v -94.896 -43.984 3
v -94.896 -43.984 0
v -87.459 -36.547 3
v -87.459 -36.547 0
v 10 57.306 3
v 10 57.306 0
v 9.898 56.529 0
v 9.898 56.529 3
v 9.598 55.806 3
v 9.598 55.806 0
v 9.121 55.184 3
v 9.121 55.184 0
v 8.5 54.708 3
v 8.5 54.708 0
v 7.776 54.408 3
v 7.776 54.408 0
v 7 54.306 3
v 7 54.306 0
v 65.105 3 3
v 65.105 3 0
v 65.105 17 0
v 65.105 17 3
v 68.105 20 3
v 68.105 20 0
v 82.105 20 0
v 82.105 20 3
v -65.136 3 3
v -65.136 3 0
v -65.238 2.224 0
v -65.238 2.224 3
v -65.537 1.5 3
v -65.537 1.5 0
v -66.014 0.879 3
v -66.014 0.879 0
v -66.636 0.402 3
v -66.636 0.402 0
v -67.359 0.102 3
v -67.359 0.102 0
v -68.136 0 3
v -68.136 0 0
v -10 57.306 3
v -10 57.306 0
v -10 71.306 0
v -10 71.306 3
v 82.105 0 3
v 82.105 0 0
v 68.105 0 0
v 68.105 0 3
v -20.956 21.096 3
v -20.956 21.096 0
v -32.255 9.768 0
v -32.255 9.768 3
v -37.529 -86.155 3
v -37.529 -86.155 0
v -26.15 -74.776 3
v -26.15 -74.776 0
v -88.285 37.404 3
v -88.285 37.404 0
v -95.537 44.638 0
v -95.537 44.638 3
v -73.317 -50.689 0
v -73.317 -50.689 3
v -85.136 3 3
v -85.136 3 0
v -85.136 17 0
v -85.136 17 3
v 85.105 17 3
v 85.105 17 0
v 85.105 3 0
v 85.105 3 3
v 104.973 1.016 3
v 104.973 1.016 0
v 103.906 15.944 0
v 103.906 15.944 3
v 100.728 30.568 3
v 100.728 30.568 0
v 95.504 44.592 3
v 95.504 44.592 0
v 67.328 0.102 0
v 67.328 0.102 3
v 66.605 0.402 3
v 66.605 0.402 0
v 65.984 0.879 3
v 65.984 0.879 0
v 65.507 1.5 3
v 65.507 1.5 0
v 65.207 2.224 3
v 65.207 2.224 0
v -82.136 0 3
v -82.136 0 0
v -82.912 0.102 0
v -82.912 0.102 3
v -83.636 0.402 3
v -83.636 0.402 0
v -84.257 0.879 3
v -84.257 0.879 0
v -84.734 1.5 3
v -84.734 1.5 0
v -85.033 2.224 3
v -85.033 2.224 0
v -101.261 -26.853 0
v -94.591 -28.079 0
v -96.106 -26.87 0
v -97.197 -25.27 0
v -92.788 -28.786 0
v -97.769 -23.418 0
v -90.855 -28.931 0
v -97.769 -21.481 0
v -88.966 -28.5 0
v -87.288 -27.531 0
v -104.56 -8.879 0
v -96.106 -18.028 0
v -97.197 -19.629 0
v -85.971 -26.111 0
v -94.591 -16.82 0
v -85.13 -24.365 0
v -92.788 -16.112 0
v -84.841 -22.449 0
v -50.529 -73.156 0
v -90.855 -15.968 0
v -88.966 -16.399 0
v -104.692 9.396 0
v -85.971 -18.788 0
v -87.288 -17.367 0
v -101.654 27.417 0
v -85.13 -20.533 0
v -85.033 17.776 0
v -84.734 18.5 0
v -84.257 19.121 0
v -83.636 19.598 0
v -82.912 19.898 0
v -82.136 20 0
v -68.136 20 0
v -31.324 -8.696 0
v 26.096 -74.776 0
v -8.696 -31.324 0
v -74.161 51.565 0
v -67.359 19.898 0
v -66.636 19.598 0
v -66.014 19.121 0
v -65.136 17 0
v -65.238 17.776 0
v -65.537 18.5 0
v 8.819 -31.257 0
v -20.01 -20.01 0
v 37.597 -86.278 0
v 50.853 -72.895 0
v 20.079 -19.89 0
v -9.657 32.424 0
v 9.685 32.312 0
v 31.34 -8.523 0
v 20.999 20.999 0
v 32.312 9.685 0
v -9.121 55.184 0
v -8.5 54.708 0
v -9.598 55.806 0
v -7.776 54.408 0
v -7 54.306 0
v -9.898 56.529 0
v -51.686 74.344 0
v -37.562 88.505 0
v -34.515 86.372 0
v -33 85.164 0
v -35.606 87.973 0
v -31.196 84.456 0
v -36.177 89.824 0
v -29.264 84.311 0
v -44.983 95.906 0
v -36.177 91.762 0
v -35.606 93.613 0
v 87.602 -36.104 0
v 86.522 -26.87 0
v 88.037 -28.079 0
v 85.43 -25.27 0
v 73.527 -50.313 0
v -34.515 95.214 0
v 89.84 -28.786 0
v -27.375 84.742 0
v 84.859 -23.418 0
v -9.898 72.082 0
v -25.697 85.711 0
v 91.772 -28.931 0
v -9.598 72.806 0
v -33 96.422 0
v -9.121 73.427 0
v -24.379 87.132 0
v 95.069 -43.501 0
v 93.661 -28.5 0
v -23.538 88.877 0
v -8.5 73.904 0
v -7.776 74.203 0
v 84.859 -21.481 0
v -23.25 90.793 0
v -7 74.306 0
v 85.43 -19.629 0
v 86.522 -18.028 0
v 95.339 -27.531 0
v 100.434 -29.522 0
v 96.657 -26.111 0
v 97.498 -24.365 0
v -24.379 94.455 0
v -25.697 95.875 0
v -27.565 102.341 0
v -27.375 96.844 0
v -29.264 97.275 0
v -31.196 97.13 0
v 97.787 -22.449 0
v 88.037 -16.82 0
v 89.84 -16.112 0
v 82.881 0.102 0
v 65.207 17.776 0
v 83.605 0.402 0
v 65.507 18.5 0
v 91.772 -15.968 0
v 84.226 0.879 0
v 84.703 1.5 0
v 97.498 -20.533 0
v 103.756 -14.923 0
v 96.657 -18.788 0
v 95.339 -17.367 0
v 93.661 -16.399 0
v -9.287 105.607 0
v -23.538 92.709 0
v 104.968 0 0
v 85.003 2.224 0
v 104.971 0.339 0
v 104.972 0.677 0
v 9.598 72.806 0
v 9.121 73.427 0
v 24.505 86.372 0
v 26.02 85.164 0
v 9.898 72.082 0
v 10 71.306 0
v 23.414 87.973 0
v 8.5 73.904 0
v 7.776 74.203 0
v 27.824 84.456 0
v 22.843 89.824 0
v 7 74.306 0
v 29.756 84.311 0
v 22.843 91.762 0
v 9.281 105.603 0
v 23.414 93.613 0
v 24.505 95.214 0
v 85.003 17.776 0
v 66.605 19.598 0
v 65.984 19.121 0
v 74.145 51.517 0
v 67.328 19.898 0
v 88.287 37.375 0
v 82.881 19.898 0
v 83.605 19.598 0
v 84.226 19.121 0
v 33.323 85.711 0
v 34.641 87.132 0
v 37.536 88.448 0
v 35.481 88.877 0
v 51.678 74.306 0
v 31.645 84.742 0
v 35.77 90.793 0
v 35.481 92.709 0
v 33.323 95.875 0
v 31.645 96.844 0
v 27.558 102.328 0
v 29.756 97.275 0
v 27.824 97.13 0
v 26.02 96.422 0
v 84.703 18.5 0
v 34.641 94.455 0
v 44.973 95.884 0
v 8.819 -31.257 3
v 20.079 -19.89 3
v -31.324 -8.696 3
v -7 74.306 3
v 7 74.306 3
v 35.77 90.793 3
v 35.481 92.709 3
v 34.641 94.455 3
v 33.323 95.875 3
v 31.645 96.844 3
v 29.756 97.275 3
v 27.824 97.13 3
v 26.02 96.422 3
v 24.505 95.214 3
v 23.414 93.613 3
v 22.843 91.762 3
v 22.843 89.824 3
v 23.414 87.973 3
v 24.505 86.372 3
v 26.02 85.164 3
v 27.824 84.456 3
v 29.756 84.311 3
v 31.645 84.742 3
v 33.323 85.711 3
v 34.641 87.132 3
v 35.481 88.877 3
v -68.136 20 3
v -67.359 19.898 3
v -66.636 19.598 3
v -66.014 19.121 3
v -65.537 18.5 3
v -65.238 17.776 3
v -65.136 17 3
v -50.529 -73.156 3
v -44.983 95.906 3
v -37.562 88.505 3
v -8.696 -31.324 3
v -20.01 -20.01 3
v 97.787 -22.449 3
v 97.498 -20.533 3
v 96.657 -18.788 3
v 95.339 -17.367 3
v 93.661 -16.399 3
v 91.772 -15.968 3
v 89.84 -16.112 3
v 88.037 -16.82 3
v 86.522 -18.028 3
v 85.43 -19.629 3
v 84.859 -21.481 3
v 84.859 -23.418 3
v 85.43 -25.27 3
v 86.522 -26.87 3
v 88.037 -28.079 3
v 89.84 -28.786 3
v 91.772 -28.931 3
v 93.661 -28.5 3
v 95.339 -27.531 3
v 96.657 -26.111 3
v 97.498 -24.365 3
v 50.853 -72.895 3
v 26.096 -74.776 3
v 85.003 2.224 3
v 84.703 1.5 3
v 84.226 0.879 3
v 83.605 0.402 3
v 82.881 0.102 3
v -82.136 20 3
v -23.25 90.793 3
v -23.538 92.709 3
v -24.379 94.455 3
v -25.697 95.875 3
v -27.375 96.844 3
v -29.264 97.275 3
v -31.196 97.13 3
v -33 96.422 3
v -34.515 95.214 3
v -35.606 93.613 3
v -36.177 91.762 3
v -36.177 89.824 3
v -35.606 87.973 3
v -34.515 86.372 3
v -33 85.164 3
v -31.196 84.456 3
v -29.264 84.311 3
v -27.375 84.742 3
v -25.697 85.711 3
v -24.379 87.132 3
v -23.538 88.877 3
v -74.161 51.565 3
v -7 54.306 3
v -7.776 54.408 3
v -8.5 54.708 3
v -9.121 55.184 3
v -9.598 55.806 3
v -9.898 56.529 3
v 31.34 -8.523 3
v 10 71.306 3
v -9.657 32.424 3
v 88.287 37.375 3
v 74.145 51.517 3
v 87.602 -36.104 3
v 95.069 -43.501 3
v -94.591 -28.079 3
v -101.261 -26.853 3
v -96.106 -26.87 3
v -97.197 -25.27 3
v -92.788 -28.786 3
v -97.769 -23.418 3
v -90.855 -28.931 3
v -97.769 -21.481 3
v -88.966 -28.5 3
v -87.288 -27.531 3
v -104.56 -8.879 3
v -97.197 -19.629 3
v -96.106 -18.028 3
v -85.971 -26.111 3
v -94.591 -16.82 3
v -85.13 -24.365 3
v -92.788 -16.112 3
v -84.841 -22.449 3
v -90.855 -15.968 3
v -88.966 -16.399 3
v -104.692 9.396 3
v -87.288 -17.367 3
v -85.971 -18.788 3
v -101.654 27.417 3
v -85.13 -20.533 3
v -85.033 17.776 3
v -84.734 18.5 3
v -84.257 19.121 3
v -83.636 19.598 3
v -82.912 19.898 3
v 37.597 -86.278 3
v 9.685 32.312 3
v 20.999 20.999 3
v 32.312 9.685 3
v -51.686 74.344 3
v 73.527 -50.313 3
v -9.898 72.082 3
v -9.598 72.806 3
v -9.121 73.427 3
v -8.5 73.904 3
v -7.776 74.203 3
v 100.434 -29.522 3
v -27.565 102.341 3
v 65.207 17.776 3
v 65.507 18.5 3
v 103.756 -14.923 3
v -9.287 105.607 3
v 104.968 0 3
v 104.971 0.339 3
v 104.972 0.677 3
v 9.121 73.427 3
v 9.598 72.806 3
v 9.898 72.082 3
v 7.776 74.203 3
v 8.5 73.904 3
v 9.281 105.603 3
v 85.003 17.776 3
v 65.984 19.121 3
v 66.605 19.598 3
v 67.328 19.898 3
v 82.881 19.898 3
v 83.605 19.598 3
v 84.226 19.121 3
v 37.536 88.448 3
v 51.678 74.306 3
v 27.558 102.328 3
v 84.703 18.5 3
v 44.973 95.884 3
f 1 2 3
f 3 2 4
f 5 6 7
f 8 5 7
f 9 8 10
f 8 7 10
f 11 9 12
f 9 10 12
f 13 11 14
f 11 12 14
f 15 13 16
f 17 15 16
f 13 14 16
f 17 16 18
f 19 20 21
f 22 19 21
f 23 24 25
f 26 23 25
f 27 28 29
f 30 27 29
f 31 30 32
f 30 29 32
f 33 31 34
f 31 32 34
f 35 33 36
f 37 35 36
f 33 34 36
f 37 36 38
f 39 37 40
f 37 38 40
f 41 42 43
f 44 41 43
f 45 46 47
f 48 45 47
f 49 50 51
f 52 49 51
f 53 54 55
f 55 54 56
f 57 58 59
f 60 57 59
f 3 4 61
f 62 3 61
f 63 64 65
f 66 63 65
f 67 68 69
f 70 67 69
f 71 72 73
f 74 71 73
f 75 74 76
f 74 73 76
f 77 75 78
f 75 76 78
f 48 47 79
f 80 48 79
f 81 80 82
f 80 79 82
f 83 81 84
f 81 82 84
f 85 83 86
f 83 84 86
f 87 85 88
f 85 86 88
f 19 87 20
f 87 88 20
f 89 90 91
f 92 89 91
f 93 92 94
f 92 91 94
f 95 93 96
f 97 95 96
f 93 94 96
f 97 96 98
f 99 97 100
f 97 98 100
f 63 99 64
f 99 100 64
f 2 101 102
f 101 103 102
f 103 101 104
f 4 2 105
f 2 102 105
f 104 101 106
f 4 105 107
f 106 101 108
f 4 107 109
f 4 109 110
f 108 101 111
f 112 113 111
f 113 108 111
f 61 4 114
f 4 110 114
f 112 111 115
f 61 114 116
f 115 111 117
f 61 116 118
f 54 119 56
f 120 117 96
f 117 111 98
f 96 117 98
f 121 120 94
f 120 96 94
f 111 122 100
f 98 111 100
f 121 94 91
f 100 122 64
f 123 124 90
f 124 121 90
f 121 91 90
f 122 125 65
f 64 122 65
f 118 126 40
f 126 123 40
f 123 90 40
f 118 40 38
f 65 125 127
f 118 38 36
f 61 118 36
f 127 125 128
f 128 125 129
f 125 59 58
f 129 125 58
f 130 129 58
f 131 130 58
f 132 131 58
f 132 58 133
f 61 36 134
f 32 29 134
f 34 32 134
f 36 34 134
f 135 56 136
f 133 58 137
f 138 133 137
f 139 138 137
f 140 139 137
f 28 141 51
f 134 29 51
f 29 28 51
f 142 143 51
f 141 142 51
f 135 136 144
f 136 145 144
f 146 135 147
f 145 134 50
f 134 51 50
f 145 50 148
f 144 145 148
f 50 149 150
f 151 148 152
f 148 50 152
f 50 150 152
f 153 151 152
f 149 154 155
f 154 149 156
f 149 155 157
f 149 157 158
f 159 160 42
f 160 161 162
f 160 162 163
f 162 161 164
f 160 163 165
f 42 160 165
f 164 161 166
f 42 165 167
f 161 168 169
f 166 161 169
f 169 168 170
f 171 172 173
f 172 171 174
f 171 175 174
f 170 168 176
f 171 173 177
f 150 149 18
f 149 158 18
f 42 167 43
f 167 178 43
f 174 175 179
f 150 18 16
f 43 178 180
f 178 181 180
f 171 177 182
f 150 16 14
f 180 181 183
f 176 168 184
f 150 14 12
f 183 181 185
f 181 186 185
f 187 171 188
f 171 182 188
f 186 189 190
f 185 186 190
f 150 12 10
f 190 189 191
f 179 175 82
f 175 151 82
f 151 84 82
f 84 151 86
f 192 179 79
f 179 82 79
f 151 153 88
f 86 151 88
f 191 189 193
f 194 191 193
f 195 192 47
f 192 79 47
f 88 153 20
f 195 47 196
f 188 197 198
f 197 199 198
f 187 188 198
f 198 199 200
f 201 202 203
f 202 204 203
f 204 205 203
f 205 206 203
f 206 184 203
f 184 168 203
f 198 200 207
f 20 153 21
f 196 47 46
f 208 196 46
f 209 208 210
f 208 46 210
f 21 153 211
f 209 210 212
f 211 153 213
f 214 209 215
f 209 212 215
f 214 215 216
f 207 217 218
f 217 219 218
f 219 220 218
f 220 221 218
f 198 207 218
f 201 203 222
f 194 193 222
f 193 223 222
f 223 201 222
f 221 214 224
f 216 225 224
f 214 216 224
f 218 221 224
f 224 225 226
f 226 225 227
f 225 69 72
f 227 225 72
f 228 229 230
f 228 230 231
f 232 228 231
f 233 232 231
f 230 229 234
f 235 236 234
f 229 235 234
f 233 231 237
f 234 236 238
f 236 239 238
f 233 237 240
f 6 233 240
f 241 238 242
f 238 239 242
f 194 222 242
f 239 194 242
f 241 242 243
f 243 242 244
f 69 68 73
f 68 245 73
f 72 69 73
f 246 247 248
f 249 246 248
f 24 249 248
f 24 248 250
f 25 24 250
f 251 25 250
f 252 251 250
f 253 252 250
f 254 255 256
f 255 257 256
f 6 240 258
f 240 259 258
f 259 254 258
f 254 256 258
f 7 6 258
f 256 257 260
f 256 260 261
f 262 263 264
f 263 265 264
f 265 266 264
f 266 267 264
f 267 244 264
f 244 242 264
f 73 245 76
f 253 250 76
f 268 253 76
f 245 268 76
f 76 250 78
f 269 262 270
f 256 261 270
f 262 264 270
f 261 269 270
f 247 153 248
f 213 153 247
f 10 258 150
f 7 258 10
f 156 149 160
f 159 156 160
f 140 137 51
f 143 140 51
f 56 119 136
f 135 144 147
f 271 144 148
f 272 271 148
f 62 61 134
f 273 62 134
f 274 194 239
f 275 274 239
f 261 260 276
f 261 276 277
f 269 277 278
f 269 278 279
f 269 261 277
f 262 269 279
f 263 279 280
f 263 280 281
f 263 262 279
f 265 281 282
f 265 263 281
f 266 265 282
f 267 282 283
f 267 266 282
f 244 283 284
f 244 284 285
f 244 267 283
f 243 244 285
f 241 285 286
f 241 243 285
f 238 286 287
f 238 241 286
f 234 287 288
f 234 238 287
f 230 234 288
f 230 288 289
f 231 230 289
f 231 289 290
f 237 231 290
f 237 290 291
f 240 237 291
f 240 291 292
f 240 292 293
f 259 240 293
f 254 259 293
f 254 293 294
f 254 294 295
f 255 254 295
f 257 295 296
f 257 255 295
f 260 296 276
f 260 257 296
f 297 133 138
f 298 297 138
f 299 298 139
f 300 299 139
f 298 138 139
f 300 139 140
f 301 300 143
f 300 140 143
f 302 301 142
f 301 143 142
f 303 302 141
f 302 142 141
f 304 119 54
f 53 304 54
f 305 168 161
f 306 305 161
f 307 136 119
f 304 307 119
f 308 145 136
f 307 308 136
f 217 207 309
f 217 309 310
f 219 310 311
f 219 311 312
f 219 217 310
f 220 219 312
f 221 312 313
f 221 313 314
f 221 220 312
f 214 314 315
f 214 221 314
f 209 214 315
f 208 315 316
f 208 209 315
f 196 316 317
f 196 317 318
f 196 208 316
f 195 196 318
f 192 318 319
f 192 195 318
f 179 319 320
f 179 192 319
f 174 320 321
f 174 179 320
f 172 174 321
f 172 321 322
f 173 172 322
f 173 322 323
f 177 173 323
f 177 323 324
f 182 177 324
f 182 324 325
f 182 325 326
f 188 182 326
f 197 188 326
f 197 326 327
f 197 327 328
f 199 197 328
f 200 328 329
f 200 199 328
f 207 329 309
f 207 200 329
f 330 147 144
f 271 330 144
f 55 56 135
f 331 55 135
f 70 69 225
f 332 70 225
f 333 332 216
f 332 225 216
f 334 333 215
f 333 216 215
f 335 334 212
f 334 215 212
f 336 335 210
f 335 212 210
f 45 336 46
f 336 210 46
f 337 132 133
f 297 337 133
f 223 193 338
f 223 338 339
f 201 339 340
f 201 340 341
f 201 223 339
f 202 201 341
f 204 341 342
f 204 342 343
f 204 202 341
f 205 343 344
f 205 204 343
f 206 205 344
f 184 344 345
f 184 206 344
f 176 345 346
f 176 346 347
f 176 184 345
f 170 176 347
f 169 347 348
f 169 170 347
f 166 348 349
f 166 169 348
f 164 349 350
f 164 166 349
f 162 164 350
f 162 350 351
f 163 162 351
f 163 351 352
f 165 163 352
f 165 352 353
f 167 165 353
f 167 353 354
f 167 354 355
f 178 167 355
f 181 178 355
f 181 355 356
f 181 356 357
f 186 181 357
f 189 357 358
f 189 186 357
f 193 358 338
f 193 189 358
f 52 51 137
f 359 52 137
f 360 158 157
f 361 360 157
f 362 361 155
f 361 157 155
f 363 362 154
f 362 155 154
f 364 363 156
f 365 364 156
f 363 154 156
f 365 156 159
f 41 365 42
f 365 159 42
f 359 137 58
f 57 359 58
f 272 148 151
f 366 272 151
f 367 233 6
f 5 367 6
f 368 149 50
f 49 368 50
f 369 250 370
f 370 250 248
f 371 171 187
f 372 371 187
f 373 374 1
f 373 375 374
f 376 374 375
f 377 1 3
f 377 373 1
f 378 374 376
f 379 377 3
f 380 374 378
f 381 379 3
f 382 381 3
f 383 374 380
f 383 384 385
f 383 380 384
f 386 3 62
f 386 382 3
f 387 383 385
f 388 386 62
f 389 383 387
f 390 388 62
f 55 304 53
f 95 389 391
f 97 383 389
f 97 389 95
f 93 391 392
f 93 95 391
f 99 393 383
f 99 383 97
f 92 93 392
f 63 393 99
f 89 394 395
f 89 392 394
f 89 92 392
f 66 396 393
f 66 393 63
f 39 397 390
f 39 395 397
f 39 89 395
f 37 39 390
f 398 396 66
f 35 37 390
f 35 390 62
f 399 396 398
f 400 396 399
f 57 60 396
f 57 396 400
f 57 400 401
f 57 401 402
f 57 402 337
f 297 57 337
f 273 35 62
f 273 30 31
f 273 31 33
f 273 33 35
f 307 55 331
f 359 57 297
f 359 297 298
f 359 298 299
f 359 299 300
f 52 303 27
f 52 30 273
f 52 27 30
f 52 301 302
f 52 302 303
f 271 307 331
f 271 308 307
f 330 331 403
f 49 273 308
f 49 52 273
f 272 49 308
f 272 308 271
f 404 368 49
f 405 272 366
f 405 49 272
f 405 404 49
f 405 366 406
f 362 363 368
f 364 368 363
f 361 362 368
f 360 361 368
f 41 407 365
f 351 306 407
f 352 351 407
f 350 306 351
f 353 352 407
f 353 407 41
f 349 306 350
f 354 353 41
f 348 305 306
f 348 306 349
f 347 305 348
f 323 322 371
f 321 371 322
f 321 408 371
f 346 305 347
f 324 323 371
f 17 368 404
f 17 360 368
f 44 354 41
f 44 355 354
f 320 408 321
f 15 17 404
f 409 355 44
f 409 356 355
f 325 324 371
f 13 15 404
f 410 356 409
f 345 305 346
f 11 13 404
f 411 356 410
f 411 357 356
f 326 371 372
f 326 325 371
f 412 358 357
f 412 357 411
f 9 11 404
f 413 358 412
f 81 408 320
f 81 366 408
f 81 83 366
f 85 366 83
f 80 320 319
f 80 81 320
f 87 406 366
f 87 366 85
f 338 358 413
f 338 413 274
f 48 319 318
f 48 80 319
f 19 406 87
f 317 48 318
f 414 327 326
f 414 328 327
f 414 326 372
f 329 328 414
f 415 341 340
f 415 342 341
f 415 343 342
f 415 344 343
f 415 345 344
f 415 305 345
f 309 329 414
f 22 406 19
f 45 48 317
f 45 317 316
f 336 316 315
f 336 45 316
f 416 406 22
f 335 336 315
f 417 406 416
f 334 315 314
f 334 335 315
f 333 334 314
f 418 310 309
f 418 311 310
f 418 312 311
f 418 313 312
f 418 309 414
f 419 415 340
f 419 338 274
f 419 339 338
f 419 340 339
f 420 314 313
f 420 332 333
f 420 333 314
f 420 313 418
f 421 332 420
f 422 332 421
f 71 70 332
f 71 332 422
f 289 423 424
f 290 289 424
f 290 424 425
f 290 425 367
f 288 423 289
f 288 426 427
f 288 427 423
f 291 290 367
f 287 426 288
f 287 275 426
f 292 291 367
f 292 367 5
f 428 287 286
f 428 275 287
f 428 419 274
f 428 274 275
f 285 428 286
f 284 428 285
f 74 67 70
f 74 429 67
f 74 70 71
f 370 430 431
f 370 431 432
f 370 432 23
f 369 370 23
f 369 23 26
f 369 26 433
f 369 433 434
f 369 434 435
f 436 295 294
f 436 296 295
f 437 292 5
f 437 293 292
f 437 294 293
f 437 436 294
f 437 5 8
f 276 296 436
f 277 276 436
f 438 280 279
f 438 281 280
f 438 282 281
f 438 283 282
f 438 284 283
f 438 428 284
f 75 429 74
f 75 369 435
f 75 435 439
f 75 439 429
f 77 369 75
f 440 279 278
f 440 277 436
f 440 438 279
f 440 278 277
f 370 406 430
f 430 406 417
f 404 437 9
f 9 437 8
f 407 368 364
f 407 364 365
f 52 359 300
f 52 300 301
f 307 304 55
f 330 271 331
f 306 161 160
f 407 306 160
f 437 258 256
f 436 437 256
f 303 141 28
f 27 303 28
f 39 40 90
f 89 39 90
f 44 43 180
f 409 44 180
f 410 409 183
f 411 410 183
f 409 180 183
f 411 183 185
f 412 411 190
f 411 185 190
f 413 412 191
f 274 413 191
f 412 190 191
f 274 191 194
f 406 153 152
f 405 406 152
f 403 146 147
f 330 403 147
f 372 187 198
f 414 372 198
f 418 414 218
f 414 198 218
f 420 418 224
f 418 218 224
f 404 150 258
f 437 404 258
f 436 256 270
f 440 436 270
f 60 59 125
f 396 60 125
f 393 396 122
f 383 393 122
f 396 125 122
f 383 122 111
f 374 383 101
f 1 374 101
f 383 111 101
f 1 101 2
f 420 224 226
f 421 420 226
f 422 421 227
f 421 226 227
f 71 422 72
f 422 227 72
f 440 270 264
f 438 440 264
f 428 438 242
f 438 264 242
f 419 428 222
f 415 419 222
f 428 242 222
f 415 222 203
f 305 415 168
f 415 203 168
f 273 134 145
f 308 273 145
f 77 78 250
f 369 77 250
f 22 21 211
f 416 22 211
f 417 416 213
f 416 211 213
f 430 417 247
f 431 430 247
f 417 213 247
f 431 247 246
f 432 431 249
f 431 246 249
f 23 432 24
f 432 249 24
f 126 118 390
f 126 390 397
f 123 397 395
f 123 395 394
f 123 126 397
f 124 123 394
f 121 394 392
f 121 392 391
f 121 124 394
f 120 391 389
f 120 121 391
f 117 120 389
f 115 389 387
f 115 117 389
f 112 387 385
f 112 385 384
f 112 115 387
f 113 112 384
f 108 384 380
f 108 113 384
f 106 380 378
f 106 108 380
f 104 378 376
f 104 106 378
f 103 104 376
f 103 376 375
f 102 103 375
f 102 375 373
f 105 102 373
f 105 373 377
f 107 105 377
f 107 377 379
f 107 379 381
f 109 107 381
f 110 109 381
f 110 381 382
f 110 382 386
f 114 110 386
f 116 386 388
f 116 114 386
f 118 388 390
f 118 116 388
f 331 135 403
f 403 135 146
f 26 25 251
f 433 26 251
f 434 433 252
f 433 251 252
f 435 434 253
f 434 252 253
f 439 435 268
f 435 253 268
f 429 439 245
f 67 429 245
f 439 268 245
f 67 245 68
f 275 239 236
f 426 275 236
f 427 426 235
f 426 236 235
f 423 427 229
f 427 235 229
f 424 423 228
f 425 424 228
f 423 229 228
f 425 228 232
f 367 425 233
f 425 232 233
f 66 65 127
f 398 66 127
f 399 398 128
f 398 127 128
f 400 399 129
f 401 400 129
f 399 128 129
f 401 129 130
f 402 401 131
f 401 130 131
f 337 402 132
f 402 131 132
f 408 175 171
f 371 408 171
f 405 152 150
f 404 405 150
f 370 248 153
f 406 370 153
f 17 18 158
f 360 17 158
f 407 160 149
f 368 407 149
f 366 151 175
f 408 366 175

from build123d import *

# Parameters (mm, degrees)
F0_R     = 6.5
F1_DEPTH = 3


with BuildPart() as f1:
    # F0 (on Top) → F1 (new body)
    with BuildSketch(Plane.XY):
        with BuildLine():
            ThreePointArc((104.967828, 0), (104.971515, 0.508028), (104.972745, 1.016069))
            ThreePointArc((104.972745, 1.016069), (102.578155, 23.312476), (95.503606, 44.591917))
            Line((95.503606, 44.591917), (88.286917, 37.375229))
            Line((88.286917, 37.375229), (74.144781, 51.517364))
            Line((74.144781, 51.517364), (32.312379, 9.684962))
            Line((32.312379, 9.684962), (20.998671, 20.998671))
            Line((20.998671, 20.998671), (9.684962, 32.312379))
            Line((9.684962, 32.312379), (51.67823, 74.305647))
            Line((51.67823, 74.305647), (37.536094, 88.447782))
            Line((37.536094, 88.447782), (44.972721, 95.88441))
            ThreePointArc((44.972721, 95.88441), (-0.002561, 106.016066), (-44.982604, 95.905566))
            Line((-44.982604, 95.905566), (-37.562306, 88.504525))
            Line((-37.562306, 88.504525), (-51.686055, 74.344027))
            Line((-51.686055, 74.344027), (-9.657337, 32.424378))
            Line((-9.657337, 32.424378), (-20.956336, 21.09598))
            Line((-20.956336, 21.09598), (-32.255336, 9.767582))
            Line((-32.255336, 9.767582), (-74.161182, 51.564677))
            Line((-74.161182, 51.564677), (-88.284931, 37.404179))
            Line((-88.284931, 37.404179), (-95.537237, 44.637663))
            ThreePointArc((-95.537237, 44.637663), (-105.024504, 0.255865), (-94.895596, -43.983908))
            Line((-94.895596, -43.983908), (-87.458969, -36.547281))
            Line((-87.458969, -36.547281), (-73.316833, -50.689416))
            Line((-73.316833, -50.689416), (-31.323566, -8.696149))
            Line((-31.323566, -8.696149), (-20.009857, -20.009857))
            Line((-20.009857, -20.009857), (-8.696149, -31.323566))
            Line((-8.696149, -31.323566), (-50.528551, -73.155968))
            Line((-50.528551, -73.155968), (-37.529173, -86.155346))
            Line((-37.529173, -86.155346), (-26.15007, -74.776243))
            Line((-26.15007, -74.776243), (0, -74.776243))
            Line((0, -74.776243), (26.095559, -74.776243))
            Line((26.095559, -74.776243), (37.596906, -86.277589))
            Line((37.596906, -86.277589), (50.853229, -72.895181))
            Line((50.853229, -72.895181), (8.819452, -31.257433))
            Line((8.819452, -31.257433), (20.079485, -19.890303))
            Line((20.079485, -19.890303), (31.339518, -8.523172))
            Line((31.339518, -8.523172), (73.527238, -50.313413))
            Line((73.527238, -50.313413), (87.60228, -36.1045))
            Line((87.60228, -36.1045), (95.068799, -43.500673))
            ThreePointArc((95.068799, -43.500673), (102.355326, -22.282148), (104.967828, 0))
        make_face()
        with Locations((-91.341169, -22.449345)):
            Circle(F0_R, mode=Mode.SUBTRACT)
        with Locations((91.286659, -22.449345)):
            Circle(F0_R, mode=Mode.SUBTRACT)
        with BuildLine():
            Line((-68.135568, 0), (-82.135568, 0))
            ThreePointArc((-82.135568, 0), (-84.256888, 0.87868), (-85.135568, 3))
            Line((-85.135568, 3), (-85.135568, 17))
            ThreePointArc((-85.135568, 17), (-84.256888, 19.12132), (-82.135568, 20))
            Line((-82.135568, 20), (-68.135568, 20))
            ThreePointArc((-68.135568, 20), (-66.014247, 19.12132), (-65.135568, 17))
            Line((-65.135568, 17), (-65.135568, 3))
            ThreePointArc((-65.135568, 3), (-66.014247, 0.87868), (-68.135568, 0))
        make_face(mode=Mode.SUBTRACT)
        with Locations((-29.749685, 90.793084)):
            Circle(F0_R, mode=Mode.SUBTRACT)
        with BuildLine():
            ThreePointArc((85.104936, 3), (84.226257, 0.87868), (82.104936, 0))
            Line((82.104936, 0), (68.104936, 0))
            ThreePointArc((68.104936, 0), (65.983616, 0.87868), (65.104936, 3))
            Line((65.104936, 3), (65.104936, 17))
            ThreePointArc((65.104936, 17), (65.983616, 19.12132), (68.104936, 20))
            Line((68.104936, 20), (82.104936, 20))
            ThreePointArc((82.104936, 20), (84.226257, 19.12132), (85.104936, 17))
            Line((85.104936, 17), (85.104936, 3))
        make_face(mode=Mode.SUBTRACT)
        with BuildLine():
            Line((7, 54.305647), (0, 54.305647))
            Line((0, 54.305647), (-7, 54.305647))
            ThreePointArc((-7, 54.305647), (-9.12132, 55.184326), (-10, 57.305647))
            Line((-10, 57.305647), (-10, 71.305647))
            ThreePointArc((-10, 71.305647), (-9.12132, 73.426967), (-7, 74.305647))
            Line((-7, 74.305647), (0, 74.305647))
            Line((0, 74.305647), (7, 74.305647))
            ThreePointArc((7, 74.305647), (9.12132, 73.426967), (10, 71.305647))
            Line((10, 71.305647), (10, 57.305647))
            ThreePointArc((10, 57.305647), (9.12132, 55.184326), (7, 54.305647))
        make_face(mode=Mode.SUBTRACT)
        with Locations((29.269962, 90.793084)):
            Circle(F0_R, mode=Mode.SUBTRACT)
    extrude(amount=F1_DEPTH)


solid = f1.part
